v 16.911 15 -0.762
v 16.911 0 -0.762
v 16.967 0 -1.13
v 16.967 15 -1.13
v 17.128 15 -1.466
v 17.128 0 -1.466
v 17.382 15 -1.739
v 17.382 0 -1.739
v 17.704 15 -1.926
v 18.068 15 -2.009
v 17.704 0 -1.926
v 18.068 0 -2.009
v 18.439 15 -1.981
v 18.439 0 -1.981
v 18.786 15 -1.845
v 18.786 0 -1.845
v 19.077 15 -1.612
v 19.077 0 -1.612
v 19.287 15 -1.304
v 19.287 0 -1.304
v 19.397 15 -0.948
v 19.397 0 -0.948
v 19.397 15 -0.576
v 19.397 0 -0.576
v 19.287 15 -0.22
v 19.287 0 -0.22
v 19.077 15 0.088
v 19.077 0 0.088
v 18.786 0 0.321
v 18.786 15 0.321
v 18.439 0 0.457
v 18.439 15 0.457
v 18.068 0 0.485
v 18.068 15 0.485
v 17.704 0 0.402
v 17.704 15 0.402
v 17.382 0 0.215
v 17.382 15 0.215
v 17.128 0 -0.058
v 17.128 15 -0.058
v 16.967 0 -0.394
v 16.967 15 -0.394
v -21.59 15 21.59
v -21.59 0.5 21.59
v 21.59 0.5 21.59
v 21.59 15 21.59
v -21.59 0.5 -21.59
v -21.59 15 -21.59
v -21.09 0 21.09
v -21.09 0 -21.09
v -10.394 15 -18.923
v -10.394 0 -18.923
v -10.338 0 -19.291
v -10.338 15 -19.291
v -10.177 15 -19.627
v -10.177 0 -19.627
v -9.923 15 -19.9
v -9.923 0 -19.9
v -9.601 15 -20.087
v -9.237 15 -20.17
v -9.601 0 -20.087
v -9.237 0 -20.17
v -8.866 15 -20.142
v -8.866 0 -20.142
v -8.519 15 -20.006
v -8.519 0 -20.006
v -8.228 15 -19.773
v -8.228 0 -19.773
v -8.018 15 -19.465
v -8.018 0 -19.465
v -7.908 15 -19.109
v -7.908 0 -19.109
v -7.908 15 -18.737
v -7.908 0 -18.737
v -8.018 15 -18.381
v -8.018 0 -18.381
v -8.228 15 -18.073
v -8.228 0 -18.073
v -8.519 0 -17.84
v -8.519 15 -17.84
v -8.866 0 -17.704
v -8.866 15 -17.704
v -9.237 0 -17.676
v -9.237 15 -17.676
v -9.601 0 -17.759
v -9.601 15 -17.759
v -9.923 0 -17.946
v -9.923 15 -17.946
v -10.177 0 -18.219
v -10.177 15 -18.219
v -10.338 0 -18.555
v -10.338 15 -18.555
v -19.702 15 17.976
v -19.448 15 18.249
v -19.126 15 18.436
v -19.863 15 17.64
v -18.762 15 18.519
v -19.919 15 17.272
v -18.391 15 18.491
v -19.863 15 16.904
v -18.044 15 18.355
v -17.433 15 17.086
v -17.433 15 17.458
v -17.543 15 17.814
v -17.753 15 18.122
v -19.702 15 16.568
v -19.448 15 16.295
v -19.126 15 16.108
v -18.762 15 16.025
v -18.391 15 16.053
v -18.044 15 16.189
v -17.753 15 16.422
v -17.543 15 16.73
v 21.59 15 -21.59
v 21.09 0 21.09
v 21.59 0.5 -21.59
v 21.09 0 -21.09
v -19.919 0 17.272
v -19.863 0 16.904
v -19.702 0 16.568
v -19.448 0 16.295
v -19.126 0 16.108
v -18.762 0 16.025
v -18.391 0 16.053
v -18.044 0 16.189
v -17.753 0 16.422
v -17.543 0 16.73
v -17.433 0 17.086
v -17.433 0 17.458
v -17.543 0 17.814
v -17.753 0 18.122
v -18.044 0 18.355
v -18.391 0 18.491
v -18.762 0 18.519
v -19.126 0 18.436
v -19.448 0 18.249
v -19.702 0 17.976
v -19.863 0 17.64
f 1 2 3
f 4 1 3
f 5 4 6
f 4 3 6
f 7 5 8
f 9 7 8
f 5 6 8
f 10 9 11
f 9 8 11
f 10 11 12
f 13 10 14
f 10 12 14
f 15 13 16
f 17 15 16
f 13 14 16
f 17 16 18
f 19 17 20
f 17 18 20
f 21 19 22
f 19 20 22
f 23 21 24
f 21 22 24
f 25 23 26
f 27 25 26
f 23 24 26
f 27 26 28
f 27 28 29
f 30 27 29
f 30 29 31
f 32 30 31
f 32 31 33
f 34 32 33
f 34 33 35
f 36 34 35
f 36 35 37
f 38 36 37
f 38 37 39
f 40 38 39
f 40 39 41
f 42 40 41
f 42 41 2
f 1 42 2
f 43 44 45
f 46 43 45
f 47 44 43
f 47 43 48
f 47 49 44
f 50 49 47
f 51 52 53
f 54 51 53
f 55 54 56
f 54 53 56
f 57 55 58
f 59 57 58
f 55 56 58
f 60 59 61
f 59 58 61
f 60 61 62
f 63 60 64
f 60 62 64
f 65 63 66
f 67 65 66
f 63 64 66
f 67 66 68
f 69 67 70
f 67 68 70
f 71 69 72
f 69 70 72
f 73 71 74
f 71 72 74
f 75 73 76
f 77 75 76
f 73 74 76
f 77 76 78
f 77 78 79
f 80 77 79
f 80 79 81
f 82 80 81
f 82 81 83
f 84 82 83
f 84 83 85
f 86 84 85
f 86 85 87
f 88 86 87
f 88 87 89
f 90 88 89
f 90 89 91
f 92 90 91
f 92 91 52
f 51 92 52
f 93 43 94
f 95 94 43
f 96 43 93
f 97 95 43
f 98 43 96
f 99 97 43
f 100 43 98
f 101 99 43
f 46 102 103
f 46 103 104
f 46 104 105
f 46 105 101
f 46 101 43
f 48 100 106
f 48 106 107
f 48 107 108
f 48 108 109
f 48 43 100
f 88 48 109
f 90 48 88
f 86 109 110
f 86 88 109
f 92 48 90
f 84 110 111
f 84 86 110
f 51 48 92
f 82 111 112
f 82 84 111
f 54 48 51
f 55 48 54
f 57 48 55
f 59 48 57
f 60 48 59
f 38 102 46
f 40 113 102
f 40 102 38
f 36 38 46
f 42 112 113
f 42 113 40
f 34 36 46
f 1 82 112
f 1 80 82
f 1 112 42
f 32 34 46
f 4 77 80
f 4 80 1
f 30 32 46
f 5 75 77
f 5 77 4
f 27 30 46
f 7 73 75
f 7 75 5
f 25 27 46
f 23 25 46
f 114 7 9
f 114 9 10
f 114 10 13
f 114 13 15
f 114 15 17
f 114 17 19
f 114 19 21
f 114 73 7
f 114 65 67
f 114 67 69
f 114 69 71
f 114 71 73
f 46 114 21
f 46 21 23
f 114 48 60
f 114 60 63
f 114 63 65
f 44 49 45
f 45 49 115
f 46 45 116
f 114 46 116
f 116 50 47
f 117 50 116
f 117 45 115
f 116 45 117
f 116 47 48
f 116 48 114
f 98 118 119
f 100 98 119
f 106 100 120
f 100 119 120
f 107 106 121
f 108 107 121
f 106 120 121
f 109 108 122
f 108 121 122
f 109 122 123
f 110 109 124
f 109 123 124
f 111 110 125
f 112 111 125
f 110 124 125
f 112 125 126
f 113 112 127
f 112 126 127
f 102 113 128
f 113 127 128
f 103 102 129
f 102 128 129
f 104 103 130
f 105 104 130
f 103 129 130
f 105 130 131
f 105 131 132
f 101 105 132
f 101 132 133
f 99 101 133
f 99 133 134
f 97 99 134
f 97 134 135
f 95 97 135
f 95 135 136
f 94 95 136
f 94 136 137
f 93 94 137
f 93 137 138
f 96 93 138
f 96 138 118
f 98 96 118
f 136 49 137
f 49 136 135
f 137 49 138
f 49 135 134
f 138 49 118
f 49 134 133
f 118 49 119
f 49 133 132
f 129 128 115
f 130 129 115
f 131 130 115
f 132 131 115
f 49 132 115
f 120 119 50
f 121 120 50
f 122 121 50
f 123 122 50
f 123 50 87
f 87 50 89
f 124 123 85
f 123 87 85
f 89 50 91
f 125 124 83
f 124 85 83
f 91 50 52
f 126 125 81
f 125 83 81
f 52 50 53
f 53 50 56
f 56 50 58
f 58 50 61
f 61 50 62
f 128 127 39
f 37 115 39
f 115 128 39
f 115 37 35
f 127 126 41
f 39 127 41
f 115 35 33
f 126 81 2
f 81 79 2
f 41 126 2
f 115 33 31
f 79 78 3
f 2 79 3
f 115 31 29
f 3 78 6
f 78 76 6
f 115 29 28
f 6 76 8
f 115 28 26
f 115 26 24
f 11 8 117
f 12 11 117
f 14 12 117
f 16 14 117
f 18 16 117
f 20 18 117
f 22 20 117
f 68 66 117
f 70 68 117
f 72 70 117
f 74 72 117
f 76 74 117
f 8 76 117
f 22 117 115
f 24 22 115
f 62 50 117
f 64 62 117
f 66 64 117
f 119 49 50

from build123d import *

# Parameters (mm, degrees)
SKETCH1_W             = 43.18
SKETCH1_H             = 43.18
BOSS_EXTRUDE1_DEPTH   = 15
M3X0_5_TAPPED_HOLE1_D = 2.5
CHAMFER1_SIZE         = 0.5


with BuildPart() as part:
    # Sketch1 → Boss-Extrude1 (new body)
    with BuildSketch(Plane(origin=(0, 0, 0), x_dir=(1, 0, 0), z_dir=(0, 1, 0))):
        Rectangle(SKETCH1_W, SKETCH1_H)
    extrude(amount=BOSS_EXTRUDE1_DEPTH)

    # M3x0.5 Tapped Hole1 (through all)
    with Locations(Plane(origin=(0, 15, 0), x_dir=(1, 0, 0), z_dir=(0, 1, 0))):
        with Locations((-18.669, -17.272), (-9.144, 18.923), (18.161, 0.762)):
            Hole(M3X0_5_TAPPED_HOLE1_D / 2)

    # Chamfer1
    chamfer1_edges = [part.edges().sort_by_distance(p)[0] for p in [
        (21.59, 0, 0),
        (0, 0, 21.59),
        (-21.59, 0, 0),
        (0, 0, -21.59),
    ]]
    chamfer(chamfer1_edges, length=CHAMFER1_SIZE)


solid = part.part
